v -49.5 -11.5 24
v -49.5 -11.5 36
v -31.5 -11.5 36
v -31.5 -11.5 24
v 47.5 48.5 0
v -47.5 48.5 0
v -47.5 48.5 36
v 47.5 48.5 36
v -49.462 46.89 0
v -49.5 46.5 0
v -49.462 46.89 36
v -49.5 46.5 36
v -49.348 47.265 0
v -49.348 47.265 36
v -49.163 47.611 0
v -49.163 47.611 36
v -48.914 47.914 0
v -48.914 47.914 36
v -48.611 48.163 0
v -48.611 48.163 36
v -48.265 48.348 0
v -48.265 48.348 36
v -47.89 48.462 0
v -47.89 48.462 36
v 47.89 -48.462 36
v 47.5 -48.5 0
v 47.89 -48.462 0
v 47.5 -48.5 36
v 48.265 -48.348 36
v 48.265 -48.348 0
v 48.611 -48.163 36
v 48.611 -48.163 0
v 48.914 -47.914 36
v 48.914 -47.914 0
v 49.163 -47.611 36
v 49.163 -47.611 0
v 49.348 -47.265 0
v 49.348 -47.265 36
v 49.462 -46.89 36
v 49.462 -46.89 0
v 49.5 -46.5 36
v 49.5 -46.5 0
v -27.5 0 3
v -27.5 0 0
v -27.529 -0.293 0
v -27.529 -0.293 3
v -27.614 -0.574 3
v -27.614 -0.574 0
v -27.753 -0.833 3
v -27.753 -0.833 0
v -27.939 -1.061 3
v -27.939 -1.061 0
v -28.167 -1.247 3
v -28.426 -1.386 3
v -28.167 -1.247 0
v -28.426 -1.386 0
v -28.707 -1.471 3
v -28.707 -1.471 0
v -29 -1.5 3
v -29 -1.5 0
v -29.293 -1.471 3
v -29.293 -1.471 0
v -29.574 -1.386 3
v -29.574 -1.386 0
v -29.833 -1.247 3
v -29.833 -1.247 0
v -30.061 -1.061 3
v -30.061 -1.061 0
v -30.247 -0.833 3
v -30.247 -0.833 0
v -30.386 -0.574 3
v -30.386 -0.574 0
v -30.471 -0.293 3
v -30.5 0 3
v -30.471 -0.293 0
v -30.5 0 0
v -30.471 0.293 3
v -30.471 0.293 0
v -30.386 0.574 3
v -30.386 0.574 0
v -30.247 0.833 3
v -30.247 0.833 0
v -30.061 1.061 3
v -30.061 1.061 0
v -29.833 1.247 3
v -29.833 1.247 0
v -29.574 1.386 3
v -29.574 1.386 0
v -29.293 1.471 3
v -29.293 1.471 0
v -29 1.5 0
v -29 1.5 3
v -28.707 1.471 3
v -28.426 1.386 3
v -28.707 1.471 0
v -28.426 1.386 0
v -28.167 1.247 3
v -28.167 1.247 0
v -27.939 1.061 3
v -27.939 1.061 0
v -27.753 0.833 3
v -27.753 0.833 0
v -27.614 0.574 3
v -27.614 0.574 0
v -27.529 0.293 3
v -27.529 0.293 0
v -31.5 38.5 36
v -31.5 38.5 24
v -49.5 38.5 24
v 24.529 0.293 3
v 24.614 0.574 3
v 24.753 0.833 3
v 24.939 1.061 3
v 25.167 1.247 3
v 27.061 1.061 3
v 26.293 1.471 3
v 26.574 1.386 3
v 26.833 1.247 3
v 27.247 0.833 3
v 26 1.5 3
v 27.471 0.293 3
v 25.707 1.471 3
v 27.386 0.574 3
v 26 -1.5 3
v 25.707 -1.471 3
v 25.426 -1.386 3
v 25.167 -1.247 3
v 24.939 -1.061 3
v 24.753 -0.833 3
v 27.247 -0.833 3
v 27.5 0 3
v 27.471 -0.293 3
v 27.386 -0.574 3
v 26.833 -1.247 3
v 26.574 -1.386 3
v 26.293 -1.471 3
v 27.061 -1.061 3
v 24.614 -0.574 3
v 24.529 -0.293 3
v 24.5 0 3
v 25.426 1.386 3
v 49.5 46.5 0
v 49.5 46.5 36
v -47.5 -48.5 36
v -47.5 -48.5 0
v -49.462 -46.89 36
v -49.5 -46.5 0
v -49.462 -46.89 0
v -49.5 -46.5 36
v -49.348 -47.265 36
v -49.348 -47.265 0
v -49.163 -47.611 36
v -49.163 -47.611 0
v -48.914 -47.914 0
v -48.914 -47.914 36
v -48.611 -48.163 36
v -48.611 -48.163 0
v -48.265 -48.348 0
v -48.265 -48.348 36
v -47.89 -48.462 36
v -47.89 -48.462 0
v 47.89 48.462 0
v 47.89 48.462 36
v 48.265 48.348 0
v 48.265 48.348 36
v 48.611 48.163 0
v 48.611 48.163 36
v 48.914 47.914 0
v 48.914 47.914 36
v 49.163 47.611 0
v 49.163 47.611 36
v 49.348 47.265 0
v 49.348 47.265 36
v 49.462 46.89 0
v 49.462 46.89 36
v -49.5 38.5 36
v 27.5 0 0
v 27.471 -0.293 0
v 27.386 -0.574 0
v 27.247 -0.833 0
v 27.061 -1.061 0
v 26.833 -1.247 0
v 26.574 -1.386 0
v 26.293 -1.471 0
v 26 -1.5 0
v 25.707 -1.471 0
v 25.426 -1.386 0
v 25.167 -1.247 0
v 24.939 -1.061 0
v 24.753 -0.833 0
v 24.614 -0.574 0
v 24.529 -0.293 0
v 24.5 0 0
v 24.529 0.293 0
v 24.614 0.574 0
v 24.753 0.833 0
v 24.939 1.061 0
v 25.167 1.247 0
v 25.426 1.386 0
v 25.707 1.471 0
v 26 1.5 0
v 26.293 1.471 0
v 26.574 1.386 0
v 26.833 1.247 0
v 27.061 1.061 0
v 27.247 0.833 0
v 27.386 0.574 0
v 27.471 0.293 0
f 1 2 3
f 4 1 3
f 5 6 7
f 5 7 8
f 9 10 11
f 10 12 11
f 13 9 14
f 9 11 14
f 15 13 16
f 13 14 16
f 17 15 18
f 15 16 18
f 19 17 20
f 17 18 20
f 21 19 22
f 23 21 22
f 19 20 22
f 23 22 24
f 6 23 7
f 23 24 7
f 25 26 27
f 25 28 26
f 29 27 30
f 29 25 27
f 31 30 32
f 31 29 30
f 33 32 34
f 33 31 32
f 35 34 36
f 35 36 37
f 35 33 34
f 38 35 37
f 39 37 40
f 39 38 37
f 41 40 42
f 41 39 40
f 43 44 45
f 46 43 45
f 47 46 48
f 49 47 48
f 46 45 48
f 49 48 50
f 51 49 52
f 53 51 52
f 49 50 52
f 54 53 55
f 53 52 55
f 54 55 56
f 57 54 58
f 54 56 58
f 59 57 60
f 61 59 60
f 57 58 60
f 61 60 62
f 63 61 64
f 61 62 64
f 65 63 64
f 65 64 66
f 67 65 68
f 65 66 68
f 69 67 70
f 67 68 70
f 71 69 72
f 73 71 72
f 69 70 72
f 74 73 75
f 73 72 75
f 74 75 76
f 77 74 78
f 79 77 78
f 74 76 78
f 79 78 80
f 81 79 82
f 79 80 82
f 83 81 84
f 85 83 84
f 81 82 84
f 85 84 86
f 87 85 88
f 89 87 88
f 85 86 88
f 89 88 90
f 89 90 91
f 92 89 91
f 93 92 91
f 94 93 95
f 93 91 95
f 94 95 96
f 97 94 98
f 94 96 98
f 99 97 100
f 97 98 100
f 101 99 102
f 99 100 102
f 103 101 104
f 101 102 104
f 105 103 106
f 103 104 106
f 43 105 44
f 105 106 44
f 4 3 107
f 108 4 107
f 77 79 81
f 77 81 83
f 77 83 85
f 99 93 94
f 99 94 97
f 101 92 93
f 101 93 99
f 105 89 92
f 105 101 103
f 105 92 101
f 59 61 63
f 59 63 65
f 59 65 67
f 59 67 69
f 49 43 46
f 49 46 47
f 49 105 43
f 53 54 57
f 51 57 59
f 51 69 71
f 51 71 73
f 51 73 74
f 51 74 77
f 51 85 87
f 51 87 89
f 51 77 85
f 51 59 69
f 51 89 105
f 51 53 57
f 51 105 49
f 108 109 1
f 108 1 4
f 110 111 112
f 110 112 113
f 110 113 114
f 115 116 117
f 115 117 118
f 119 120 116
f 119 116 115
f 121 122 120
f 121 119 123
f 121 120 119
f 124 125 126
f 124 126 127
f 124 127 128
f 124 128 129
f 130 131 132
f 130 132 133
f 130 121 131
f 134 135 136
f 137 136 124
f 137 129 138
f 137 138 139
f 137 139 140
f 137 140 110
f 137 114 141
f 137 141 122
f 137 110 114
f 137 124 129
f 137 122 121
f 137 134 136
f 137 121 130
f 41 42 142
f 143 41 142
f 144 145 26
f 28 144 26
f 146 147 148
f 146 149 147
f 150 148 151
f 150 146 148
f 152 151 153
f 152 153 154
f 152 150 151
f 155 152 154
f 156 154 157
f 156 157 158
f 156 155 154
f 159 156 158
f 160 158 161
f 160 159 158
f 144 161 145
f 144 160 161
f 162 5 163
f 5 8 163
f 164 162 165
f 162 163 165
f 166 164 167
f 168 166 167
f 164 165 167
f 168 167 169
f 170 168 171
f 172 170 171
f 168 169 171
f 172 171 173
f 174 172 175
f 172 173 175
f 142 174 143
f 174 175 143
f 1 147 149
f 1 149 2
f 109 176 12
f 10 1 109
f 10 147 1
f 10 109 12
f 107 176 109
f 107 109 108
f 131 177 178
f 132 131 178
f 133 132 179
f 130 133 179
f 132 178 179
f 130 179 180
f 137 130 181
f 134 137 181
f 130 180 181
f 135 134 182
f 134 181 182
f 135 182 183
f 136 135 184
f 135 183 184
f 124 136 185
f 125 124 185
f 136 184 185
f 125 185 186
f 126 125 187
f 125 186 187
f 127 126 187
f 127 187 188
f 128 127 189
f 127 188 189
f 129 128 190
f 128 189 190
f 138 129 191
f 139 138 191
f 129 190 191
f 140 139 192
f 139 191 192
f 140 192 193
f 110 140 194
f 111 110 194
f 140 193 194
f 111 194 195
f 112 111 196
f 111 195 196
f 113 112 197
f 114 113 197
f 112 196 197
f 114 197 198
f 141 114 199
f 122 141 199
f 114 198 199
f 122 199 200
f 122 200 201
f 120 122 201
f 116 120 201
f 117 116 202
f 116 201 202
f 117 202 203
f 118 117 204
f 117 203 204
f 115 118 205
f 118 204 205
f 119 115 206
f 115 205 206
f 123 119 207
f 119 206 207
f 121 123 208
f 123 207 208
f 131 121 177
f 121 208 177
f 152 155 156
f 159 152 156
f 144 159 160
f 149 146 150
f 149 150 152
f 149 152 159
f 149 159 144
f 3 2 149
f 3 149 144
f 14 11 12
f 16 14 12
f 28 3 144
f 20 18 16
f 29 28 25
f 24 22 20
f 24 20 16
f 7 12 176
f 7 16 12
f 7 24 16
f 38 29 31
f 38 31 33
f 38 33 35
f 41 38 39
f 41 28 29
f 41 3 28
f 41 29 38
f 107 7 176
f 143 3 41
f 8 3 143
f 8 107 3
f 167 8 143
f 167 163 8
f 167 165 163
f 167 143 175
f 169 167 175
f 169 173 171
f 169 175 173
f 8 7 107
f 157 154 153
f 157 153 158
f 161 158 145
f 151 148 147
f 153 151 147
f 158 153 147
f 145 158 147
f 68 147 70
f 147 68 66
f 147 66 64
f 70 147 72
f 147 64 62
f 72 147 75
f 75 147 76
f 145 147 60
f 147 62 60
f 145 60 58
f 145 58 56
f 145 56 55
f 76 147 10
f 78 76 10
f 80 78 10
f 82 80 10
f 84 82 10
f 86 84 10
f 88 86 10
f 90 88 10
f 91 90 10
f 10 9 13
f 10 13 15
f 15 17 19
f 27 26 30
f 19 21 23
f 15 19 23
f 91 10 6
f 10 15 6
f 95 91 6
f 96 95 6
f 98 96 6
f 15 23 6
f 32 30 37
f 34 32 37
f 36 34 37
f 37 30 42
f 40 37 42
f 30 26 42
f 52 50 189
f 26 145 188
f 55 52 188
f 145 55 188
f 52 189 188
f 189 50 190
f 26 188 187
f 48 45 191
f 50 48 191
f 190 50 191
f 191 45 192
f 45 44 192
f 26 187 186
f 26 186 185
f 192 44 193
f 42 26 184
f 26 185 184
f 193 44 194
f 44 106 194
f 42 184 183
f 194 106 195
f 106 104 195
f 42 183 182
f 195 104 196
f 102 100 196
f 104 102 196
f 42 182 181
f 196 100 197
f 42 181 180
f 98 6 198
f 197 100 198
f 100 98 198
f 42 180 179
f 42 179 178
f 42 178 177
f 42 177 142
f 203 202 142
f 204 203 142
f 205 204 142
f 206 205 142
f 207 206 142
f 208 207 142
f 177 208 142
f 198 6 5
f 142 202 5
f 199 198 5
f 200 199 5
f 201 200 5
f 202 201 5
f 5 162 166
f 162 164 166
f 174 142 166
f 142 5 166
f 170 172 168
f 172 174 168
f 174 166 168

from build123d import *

# Parameters (mm, degrees)
F0_W     = 99
F0_H     = 97
F1_DEPTH = 36
F2_R     = 1.5
F3_DEPTH = 3
F4_W     = 18
F4_H     = 50
F5_DEPTH = 12
F6_R     = 2


with BuildPart() as f1:
    # F0 (on Top) → F1 (new body)
    with BuildSketch(Plane.XY):
        Rectangle(F0_W, F0_H)
    extrude(amount=F1_DEPTH)

    # F2 (on face) → F3 (cut)
    with BuildSketch(Plane(origin=(0, 0, 0), x_dir=(1, 0, 0), z_dir=(0, 0, -1))):
        with Locations((-29, 0)):
            Circle(F2_R)
        with Locations((26, 0)):
            Circle(F2_R)
    extrude(amount=-F3_DEPTH, mode=Mode.SUBTRACT)

    # F4 (on face) → F5 (cut)
    with BuildSketch(Plane.XY.offset(36)):
        with Locations((-40.5, 13.5)):
            Rectangle(F4_W, F4_H)
    extrude(amount=-F5_DEPTH, mode=Mode.SUBTRACT)

    # F6
    f6_edges = [f1.edges().sort_by_distance(p)[0] for p in [
        (-49.5, -48.5, 18),
        (49.5, -48.5, 18),
        (49.5, 48.5, 18),
        (-49.5, 48.5, 18),
    ]]
    fillet(f6_edges, radius=F6_R)


solid = f1.part
